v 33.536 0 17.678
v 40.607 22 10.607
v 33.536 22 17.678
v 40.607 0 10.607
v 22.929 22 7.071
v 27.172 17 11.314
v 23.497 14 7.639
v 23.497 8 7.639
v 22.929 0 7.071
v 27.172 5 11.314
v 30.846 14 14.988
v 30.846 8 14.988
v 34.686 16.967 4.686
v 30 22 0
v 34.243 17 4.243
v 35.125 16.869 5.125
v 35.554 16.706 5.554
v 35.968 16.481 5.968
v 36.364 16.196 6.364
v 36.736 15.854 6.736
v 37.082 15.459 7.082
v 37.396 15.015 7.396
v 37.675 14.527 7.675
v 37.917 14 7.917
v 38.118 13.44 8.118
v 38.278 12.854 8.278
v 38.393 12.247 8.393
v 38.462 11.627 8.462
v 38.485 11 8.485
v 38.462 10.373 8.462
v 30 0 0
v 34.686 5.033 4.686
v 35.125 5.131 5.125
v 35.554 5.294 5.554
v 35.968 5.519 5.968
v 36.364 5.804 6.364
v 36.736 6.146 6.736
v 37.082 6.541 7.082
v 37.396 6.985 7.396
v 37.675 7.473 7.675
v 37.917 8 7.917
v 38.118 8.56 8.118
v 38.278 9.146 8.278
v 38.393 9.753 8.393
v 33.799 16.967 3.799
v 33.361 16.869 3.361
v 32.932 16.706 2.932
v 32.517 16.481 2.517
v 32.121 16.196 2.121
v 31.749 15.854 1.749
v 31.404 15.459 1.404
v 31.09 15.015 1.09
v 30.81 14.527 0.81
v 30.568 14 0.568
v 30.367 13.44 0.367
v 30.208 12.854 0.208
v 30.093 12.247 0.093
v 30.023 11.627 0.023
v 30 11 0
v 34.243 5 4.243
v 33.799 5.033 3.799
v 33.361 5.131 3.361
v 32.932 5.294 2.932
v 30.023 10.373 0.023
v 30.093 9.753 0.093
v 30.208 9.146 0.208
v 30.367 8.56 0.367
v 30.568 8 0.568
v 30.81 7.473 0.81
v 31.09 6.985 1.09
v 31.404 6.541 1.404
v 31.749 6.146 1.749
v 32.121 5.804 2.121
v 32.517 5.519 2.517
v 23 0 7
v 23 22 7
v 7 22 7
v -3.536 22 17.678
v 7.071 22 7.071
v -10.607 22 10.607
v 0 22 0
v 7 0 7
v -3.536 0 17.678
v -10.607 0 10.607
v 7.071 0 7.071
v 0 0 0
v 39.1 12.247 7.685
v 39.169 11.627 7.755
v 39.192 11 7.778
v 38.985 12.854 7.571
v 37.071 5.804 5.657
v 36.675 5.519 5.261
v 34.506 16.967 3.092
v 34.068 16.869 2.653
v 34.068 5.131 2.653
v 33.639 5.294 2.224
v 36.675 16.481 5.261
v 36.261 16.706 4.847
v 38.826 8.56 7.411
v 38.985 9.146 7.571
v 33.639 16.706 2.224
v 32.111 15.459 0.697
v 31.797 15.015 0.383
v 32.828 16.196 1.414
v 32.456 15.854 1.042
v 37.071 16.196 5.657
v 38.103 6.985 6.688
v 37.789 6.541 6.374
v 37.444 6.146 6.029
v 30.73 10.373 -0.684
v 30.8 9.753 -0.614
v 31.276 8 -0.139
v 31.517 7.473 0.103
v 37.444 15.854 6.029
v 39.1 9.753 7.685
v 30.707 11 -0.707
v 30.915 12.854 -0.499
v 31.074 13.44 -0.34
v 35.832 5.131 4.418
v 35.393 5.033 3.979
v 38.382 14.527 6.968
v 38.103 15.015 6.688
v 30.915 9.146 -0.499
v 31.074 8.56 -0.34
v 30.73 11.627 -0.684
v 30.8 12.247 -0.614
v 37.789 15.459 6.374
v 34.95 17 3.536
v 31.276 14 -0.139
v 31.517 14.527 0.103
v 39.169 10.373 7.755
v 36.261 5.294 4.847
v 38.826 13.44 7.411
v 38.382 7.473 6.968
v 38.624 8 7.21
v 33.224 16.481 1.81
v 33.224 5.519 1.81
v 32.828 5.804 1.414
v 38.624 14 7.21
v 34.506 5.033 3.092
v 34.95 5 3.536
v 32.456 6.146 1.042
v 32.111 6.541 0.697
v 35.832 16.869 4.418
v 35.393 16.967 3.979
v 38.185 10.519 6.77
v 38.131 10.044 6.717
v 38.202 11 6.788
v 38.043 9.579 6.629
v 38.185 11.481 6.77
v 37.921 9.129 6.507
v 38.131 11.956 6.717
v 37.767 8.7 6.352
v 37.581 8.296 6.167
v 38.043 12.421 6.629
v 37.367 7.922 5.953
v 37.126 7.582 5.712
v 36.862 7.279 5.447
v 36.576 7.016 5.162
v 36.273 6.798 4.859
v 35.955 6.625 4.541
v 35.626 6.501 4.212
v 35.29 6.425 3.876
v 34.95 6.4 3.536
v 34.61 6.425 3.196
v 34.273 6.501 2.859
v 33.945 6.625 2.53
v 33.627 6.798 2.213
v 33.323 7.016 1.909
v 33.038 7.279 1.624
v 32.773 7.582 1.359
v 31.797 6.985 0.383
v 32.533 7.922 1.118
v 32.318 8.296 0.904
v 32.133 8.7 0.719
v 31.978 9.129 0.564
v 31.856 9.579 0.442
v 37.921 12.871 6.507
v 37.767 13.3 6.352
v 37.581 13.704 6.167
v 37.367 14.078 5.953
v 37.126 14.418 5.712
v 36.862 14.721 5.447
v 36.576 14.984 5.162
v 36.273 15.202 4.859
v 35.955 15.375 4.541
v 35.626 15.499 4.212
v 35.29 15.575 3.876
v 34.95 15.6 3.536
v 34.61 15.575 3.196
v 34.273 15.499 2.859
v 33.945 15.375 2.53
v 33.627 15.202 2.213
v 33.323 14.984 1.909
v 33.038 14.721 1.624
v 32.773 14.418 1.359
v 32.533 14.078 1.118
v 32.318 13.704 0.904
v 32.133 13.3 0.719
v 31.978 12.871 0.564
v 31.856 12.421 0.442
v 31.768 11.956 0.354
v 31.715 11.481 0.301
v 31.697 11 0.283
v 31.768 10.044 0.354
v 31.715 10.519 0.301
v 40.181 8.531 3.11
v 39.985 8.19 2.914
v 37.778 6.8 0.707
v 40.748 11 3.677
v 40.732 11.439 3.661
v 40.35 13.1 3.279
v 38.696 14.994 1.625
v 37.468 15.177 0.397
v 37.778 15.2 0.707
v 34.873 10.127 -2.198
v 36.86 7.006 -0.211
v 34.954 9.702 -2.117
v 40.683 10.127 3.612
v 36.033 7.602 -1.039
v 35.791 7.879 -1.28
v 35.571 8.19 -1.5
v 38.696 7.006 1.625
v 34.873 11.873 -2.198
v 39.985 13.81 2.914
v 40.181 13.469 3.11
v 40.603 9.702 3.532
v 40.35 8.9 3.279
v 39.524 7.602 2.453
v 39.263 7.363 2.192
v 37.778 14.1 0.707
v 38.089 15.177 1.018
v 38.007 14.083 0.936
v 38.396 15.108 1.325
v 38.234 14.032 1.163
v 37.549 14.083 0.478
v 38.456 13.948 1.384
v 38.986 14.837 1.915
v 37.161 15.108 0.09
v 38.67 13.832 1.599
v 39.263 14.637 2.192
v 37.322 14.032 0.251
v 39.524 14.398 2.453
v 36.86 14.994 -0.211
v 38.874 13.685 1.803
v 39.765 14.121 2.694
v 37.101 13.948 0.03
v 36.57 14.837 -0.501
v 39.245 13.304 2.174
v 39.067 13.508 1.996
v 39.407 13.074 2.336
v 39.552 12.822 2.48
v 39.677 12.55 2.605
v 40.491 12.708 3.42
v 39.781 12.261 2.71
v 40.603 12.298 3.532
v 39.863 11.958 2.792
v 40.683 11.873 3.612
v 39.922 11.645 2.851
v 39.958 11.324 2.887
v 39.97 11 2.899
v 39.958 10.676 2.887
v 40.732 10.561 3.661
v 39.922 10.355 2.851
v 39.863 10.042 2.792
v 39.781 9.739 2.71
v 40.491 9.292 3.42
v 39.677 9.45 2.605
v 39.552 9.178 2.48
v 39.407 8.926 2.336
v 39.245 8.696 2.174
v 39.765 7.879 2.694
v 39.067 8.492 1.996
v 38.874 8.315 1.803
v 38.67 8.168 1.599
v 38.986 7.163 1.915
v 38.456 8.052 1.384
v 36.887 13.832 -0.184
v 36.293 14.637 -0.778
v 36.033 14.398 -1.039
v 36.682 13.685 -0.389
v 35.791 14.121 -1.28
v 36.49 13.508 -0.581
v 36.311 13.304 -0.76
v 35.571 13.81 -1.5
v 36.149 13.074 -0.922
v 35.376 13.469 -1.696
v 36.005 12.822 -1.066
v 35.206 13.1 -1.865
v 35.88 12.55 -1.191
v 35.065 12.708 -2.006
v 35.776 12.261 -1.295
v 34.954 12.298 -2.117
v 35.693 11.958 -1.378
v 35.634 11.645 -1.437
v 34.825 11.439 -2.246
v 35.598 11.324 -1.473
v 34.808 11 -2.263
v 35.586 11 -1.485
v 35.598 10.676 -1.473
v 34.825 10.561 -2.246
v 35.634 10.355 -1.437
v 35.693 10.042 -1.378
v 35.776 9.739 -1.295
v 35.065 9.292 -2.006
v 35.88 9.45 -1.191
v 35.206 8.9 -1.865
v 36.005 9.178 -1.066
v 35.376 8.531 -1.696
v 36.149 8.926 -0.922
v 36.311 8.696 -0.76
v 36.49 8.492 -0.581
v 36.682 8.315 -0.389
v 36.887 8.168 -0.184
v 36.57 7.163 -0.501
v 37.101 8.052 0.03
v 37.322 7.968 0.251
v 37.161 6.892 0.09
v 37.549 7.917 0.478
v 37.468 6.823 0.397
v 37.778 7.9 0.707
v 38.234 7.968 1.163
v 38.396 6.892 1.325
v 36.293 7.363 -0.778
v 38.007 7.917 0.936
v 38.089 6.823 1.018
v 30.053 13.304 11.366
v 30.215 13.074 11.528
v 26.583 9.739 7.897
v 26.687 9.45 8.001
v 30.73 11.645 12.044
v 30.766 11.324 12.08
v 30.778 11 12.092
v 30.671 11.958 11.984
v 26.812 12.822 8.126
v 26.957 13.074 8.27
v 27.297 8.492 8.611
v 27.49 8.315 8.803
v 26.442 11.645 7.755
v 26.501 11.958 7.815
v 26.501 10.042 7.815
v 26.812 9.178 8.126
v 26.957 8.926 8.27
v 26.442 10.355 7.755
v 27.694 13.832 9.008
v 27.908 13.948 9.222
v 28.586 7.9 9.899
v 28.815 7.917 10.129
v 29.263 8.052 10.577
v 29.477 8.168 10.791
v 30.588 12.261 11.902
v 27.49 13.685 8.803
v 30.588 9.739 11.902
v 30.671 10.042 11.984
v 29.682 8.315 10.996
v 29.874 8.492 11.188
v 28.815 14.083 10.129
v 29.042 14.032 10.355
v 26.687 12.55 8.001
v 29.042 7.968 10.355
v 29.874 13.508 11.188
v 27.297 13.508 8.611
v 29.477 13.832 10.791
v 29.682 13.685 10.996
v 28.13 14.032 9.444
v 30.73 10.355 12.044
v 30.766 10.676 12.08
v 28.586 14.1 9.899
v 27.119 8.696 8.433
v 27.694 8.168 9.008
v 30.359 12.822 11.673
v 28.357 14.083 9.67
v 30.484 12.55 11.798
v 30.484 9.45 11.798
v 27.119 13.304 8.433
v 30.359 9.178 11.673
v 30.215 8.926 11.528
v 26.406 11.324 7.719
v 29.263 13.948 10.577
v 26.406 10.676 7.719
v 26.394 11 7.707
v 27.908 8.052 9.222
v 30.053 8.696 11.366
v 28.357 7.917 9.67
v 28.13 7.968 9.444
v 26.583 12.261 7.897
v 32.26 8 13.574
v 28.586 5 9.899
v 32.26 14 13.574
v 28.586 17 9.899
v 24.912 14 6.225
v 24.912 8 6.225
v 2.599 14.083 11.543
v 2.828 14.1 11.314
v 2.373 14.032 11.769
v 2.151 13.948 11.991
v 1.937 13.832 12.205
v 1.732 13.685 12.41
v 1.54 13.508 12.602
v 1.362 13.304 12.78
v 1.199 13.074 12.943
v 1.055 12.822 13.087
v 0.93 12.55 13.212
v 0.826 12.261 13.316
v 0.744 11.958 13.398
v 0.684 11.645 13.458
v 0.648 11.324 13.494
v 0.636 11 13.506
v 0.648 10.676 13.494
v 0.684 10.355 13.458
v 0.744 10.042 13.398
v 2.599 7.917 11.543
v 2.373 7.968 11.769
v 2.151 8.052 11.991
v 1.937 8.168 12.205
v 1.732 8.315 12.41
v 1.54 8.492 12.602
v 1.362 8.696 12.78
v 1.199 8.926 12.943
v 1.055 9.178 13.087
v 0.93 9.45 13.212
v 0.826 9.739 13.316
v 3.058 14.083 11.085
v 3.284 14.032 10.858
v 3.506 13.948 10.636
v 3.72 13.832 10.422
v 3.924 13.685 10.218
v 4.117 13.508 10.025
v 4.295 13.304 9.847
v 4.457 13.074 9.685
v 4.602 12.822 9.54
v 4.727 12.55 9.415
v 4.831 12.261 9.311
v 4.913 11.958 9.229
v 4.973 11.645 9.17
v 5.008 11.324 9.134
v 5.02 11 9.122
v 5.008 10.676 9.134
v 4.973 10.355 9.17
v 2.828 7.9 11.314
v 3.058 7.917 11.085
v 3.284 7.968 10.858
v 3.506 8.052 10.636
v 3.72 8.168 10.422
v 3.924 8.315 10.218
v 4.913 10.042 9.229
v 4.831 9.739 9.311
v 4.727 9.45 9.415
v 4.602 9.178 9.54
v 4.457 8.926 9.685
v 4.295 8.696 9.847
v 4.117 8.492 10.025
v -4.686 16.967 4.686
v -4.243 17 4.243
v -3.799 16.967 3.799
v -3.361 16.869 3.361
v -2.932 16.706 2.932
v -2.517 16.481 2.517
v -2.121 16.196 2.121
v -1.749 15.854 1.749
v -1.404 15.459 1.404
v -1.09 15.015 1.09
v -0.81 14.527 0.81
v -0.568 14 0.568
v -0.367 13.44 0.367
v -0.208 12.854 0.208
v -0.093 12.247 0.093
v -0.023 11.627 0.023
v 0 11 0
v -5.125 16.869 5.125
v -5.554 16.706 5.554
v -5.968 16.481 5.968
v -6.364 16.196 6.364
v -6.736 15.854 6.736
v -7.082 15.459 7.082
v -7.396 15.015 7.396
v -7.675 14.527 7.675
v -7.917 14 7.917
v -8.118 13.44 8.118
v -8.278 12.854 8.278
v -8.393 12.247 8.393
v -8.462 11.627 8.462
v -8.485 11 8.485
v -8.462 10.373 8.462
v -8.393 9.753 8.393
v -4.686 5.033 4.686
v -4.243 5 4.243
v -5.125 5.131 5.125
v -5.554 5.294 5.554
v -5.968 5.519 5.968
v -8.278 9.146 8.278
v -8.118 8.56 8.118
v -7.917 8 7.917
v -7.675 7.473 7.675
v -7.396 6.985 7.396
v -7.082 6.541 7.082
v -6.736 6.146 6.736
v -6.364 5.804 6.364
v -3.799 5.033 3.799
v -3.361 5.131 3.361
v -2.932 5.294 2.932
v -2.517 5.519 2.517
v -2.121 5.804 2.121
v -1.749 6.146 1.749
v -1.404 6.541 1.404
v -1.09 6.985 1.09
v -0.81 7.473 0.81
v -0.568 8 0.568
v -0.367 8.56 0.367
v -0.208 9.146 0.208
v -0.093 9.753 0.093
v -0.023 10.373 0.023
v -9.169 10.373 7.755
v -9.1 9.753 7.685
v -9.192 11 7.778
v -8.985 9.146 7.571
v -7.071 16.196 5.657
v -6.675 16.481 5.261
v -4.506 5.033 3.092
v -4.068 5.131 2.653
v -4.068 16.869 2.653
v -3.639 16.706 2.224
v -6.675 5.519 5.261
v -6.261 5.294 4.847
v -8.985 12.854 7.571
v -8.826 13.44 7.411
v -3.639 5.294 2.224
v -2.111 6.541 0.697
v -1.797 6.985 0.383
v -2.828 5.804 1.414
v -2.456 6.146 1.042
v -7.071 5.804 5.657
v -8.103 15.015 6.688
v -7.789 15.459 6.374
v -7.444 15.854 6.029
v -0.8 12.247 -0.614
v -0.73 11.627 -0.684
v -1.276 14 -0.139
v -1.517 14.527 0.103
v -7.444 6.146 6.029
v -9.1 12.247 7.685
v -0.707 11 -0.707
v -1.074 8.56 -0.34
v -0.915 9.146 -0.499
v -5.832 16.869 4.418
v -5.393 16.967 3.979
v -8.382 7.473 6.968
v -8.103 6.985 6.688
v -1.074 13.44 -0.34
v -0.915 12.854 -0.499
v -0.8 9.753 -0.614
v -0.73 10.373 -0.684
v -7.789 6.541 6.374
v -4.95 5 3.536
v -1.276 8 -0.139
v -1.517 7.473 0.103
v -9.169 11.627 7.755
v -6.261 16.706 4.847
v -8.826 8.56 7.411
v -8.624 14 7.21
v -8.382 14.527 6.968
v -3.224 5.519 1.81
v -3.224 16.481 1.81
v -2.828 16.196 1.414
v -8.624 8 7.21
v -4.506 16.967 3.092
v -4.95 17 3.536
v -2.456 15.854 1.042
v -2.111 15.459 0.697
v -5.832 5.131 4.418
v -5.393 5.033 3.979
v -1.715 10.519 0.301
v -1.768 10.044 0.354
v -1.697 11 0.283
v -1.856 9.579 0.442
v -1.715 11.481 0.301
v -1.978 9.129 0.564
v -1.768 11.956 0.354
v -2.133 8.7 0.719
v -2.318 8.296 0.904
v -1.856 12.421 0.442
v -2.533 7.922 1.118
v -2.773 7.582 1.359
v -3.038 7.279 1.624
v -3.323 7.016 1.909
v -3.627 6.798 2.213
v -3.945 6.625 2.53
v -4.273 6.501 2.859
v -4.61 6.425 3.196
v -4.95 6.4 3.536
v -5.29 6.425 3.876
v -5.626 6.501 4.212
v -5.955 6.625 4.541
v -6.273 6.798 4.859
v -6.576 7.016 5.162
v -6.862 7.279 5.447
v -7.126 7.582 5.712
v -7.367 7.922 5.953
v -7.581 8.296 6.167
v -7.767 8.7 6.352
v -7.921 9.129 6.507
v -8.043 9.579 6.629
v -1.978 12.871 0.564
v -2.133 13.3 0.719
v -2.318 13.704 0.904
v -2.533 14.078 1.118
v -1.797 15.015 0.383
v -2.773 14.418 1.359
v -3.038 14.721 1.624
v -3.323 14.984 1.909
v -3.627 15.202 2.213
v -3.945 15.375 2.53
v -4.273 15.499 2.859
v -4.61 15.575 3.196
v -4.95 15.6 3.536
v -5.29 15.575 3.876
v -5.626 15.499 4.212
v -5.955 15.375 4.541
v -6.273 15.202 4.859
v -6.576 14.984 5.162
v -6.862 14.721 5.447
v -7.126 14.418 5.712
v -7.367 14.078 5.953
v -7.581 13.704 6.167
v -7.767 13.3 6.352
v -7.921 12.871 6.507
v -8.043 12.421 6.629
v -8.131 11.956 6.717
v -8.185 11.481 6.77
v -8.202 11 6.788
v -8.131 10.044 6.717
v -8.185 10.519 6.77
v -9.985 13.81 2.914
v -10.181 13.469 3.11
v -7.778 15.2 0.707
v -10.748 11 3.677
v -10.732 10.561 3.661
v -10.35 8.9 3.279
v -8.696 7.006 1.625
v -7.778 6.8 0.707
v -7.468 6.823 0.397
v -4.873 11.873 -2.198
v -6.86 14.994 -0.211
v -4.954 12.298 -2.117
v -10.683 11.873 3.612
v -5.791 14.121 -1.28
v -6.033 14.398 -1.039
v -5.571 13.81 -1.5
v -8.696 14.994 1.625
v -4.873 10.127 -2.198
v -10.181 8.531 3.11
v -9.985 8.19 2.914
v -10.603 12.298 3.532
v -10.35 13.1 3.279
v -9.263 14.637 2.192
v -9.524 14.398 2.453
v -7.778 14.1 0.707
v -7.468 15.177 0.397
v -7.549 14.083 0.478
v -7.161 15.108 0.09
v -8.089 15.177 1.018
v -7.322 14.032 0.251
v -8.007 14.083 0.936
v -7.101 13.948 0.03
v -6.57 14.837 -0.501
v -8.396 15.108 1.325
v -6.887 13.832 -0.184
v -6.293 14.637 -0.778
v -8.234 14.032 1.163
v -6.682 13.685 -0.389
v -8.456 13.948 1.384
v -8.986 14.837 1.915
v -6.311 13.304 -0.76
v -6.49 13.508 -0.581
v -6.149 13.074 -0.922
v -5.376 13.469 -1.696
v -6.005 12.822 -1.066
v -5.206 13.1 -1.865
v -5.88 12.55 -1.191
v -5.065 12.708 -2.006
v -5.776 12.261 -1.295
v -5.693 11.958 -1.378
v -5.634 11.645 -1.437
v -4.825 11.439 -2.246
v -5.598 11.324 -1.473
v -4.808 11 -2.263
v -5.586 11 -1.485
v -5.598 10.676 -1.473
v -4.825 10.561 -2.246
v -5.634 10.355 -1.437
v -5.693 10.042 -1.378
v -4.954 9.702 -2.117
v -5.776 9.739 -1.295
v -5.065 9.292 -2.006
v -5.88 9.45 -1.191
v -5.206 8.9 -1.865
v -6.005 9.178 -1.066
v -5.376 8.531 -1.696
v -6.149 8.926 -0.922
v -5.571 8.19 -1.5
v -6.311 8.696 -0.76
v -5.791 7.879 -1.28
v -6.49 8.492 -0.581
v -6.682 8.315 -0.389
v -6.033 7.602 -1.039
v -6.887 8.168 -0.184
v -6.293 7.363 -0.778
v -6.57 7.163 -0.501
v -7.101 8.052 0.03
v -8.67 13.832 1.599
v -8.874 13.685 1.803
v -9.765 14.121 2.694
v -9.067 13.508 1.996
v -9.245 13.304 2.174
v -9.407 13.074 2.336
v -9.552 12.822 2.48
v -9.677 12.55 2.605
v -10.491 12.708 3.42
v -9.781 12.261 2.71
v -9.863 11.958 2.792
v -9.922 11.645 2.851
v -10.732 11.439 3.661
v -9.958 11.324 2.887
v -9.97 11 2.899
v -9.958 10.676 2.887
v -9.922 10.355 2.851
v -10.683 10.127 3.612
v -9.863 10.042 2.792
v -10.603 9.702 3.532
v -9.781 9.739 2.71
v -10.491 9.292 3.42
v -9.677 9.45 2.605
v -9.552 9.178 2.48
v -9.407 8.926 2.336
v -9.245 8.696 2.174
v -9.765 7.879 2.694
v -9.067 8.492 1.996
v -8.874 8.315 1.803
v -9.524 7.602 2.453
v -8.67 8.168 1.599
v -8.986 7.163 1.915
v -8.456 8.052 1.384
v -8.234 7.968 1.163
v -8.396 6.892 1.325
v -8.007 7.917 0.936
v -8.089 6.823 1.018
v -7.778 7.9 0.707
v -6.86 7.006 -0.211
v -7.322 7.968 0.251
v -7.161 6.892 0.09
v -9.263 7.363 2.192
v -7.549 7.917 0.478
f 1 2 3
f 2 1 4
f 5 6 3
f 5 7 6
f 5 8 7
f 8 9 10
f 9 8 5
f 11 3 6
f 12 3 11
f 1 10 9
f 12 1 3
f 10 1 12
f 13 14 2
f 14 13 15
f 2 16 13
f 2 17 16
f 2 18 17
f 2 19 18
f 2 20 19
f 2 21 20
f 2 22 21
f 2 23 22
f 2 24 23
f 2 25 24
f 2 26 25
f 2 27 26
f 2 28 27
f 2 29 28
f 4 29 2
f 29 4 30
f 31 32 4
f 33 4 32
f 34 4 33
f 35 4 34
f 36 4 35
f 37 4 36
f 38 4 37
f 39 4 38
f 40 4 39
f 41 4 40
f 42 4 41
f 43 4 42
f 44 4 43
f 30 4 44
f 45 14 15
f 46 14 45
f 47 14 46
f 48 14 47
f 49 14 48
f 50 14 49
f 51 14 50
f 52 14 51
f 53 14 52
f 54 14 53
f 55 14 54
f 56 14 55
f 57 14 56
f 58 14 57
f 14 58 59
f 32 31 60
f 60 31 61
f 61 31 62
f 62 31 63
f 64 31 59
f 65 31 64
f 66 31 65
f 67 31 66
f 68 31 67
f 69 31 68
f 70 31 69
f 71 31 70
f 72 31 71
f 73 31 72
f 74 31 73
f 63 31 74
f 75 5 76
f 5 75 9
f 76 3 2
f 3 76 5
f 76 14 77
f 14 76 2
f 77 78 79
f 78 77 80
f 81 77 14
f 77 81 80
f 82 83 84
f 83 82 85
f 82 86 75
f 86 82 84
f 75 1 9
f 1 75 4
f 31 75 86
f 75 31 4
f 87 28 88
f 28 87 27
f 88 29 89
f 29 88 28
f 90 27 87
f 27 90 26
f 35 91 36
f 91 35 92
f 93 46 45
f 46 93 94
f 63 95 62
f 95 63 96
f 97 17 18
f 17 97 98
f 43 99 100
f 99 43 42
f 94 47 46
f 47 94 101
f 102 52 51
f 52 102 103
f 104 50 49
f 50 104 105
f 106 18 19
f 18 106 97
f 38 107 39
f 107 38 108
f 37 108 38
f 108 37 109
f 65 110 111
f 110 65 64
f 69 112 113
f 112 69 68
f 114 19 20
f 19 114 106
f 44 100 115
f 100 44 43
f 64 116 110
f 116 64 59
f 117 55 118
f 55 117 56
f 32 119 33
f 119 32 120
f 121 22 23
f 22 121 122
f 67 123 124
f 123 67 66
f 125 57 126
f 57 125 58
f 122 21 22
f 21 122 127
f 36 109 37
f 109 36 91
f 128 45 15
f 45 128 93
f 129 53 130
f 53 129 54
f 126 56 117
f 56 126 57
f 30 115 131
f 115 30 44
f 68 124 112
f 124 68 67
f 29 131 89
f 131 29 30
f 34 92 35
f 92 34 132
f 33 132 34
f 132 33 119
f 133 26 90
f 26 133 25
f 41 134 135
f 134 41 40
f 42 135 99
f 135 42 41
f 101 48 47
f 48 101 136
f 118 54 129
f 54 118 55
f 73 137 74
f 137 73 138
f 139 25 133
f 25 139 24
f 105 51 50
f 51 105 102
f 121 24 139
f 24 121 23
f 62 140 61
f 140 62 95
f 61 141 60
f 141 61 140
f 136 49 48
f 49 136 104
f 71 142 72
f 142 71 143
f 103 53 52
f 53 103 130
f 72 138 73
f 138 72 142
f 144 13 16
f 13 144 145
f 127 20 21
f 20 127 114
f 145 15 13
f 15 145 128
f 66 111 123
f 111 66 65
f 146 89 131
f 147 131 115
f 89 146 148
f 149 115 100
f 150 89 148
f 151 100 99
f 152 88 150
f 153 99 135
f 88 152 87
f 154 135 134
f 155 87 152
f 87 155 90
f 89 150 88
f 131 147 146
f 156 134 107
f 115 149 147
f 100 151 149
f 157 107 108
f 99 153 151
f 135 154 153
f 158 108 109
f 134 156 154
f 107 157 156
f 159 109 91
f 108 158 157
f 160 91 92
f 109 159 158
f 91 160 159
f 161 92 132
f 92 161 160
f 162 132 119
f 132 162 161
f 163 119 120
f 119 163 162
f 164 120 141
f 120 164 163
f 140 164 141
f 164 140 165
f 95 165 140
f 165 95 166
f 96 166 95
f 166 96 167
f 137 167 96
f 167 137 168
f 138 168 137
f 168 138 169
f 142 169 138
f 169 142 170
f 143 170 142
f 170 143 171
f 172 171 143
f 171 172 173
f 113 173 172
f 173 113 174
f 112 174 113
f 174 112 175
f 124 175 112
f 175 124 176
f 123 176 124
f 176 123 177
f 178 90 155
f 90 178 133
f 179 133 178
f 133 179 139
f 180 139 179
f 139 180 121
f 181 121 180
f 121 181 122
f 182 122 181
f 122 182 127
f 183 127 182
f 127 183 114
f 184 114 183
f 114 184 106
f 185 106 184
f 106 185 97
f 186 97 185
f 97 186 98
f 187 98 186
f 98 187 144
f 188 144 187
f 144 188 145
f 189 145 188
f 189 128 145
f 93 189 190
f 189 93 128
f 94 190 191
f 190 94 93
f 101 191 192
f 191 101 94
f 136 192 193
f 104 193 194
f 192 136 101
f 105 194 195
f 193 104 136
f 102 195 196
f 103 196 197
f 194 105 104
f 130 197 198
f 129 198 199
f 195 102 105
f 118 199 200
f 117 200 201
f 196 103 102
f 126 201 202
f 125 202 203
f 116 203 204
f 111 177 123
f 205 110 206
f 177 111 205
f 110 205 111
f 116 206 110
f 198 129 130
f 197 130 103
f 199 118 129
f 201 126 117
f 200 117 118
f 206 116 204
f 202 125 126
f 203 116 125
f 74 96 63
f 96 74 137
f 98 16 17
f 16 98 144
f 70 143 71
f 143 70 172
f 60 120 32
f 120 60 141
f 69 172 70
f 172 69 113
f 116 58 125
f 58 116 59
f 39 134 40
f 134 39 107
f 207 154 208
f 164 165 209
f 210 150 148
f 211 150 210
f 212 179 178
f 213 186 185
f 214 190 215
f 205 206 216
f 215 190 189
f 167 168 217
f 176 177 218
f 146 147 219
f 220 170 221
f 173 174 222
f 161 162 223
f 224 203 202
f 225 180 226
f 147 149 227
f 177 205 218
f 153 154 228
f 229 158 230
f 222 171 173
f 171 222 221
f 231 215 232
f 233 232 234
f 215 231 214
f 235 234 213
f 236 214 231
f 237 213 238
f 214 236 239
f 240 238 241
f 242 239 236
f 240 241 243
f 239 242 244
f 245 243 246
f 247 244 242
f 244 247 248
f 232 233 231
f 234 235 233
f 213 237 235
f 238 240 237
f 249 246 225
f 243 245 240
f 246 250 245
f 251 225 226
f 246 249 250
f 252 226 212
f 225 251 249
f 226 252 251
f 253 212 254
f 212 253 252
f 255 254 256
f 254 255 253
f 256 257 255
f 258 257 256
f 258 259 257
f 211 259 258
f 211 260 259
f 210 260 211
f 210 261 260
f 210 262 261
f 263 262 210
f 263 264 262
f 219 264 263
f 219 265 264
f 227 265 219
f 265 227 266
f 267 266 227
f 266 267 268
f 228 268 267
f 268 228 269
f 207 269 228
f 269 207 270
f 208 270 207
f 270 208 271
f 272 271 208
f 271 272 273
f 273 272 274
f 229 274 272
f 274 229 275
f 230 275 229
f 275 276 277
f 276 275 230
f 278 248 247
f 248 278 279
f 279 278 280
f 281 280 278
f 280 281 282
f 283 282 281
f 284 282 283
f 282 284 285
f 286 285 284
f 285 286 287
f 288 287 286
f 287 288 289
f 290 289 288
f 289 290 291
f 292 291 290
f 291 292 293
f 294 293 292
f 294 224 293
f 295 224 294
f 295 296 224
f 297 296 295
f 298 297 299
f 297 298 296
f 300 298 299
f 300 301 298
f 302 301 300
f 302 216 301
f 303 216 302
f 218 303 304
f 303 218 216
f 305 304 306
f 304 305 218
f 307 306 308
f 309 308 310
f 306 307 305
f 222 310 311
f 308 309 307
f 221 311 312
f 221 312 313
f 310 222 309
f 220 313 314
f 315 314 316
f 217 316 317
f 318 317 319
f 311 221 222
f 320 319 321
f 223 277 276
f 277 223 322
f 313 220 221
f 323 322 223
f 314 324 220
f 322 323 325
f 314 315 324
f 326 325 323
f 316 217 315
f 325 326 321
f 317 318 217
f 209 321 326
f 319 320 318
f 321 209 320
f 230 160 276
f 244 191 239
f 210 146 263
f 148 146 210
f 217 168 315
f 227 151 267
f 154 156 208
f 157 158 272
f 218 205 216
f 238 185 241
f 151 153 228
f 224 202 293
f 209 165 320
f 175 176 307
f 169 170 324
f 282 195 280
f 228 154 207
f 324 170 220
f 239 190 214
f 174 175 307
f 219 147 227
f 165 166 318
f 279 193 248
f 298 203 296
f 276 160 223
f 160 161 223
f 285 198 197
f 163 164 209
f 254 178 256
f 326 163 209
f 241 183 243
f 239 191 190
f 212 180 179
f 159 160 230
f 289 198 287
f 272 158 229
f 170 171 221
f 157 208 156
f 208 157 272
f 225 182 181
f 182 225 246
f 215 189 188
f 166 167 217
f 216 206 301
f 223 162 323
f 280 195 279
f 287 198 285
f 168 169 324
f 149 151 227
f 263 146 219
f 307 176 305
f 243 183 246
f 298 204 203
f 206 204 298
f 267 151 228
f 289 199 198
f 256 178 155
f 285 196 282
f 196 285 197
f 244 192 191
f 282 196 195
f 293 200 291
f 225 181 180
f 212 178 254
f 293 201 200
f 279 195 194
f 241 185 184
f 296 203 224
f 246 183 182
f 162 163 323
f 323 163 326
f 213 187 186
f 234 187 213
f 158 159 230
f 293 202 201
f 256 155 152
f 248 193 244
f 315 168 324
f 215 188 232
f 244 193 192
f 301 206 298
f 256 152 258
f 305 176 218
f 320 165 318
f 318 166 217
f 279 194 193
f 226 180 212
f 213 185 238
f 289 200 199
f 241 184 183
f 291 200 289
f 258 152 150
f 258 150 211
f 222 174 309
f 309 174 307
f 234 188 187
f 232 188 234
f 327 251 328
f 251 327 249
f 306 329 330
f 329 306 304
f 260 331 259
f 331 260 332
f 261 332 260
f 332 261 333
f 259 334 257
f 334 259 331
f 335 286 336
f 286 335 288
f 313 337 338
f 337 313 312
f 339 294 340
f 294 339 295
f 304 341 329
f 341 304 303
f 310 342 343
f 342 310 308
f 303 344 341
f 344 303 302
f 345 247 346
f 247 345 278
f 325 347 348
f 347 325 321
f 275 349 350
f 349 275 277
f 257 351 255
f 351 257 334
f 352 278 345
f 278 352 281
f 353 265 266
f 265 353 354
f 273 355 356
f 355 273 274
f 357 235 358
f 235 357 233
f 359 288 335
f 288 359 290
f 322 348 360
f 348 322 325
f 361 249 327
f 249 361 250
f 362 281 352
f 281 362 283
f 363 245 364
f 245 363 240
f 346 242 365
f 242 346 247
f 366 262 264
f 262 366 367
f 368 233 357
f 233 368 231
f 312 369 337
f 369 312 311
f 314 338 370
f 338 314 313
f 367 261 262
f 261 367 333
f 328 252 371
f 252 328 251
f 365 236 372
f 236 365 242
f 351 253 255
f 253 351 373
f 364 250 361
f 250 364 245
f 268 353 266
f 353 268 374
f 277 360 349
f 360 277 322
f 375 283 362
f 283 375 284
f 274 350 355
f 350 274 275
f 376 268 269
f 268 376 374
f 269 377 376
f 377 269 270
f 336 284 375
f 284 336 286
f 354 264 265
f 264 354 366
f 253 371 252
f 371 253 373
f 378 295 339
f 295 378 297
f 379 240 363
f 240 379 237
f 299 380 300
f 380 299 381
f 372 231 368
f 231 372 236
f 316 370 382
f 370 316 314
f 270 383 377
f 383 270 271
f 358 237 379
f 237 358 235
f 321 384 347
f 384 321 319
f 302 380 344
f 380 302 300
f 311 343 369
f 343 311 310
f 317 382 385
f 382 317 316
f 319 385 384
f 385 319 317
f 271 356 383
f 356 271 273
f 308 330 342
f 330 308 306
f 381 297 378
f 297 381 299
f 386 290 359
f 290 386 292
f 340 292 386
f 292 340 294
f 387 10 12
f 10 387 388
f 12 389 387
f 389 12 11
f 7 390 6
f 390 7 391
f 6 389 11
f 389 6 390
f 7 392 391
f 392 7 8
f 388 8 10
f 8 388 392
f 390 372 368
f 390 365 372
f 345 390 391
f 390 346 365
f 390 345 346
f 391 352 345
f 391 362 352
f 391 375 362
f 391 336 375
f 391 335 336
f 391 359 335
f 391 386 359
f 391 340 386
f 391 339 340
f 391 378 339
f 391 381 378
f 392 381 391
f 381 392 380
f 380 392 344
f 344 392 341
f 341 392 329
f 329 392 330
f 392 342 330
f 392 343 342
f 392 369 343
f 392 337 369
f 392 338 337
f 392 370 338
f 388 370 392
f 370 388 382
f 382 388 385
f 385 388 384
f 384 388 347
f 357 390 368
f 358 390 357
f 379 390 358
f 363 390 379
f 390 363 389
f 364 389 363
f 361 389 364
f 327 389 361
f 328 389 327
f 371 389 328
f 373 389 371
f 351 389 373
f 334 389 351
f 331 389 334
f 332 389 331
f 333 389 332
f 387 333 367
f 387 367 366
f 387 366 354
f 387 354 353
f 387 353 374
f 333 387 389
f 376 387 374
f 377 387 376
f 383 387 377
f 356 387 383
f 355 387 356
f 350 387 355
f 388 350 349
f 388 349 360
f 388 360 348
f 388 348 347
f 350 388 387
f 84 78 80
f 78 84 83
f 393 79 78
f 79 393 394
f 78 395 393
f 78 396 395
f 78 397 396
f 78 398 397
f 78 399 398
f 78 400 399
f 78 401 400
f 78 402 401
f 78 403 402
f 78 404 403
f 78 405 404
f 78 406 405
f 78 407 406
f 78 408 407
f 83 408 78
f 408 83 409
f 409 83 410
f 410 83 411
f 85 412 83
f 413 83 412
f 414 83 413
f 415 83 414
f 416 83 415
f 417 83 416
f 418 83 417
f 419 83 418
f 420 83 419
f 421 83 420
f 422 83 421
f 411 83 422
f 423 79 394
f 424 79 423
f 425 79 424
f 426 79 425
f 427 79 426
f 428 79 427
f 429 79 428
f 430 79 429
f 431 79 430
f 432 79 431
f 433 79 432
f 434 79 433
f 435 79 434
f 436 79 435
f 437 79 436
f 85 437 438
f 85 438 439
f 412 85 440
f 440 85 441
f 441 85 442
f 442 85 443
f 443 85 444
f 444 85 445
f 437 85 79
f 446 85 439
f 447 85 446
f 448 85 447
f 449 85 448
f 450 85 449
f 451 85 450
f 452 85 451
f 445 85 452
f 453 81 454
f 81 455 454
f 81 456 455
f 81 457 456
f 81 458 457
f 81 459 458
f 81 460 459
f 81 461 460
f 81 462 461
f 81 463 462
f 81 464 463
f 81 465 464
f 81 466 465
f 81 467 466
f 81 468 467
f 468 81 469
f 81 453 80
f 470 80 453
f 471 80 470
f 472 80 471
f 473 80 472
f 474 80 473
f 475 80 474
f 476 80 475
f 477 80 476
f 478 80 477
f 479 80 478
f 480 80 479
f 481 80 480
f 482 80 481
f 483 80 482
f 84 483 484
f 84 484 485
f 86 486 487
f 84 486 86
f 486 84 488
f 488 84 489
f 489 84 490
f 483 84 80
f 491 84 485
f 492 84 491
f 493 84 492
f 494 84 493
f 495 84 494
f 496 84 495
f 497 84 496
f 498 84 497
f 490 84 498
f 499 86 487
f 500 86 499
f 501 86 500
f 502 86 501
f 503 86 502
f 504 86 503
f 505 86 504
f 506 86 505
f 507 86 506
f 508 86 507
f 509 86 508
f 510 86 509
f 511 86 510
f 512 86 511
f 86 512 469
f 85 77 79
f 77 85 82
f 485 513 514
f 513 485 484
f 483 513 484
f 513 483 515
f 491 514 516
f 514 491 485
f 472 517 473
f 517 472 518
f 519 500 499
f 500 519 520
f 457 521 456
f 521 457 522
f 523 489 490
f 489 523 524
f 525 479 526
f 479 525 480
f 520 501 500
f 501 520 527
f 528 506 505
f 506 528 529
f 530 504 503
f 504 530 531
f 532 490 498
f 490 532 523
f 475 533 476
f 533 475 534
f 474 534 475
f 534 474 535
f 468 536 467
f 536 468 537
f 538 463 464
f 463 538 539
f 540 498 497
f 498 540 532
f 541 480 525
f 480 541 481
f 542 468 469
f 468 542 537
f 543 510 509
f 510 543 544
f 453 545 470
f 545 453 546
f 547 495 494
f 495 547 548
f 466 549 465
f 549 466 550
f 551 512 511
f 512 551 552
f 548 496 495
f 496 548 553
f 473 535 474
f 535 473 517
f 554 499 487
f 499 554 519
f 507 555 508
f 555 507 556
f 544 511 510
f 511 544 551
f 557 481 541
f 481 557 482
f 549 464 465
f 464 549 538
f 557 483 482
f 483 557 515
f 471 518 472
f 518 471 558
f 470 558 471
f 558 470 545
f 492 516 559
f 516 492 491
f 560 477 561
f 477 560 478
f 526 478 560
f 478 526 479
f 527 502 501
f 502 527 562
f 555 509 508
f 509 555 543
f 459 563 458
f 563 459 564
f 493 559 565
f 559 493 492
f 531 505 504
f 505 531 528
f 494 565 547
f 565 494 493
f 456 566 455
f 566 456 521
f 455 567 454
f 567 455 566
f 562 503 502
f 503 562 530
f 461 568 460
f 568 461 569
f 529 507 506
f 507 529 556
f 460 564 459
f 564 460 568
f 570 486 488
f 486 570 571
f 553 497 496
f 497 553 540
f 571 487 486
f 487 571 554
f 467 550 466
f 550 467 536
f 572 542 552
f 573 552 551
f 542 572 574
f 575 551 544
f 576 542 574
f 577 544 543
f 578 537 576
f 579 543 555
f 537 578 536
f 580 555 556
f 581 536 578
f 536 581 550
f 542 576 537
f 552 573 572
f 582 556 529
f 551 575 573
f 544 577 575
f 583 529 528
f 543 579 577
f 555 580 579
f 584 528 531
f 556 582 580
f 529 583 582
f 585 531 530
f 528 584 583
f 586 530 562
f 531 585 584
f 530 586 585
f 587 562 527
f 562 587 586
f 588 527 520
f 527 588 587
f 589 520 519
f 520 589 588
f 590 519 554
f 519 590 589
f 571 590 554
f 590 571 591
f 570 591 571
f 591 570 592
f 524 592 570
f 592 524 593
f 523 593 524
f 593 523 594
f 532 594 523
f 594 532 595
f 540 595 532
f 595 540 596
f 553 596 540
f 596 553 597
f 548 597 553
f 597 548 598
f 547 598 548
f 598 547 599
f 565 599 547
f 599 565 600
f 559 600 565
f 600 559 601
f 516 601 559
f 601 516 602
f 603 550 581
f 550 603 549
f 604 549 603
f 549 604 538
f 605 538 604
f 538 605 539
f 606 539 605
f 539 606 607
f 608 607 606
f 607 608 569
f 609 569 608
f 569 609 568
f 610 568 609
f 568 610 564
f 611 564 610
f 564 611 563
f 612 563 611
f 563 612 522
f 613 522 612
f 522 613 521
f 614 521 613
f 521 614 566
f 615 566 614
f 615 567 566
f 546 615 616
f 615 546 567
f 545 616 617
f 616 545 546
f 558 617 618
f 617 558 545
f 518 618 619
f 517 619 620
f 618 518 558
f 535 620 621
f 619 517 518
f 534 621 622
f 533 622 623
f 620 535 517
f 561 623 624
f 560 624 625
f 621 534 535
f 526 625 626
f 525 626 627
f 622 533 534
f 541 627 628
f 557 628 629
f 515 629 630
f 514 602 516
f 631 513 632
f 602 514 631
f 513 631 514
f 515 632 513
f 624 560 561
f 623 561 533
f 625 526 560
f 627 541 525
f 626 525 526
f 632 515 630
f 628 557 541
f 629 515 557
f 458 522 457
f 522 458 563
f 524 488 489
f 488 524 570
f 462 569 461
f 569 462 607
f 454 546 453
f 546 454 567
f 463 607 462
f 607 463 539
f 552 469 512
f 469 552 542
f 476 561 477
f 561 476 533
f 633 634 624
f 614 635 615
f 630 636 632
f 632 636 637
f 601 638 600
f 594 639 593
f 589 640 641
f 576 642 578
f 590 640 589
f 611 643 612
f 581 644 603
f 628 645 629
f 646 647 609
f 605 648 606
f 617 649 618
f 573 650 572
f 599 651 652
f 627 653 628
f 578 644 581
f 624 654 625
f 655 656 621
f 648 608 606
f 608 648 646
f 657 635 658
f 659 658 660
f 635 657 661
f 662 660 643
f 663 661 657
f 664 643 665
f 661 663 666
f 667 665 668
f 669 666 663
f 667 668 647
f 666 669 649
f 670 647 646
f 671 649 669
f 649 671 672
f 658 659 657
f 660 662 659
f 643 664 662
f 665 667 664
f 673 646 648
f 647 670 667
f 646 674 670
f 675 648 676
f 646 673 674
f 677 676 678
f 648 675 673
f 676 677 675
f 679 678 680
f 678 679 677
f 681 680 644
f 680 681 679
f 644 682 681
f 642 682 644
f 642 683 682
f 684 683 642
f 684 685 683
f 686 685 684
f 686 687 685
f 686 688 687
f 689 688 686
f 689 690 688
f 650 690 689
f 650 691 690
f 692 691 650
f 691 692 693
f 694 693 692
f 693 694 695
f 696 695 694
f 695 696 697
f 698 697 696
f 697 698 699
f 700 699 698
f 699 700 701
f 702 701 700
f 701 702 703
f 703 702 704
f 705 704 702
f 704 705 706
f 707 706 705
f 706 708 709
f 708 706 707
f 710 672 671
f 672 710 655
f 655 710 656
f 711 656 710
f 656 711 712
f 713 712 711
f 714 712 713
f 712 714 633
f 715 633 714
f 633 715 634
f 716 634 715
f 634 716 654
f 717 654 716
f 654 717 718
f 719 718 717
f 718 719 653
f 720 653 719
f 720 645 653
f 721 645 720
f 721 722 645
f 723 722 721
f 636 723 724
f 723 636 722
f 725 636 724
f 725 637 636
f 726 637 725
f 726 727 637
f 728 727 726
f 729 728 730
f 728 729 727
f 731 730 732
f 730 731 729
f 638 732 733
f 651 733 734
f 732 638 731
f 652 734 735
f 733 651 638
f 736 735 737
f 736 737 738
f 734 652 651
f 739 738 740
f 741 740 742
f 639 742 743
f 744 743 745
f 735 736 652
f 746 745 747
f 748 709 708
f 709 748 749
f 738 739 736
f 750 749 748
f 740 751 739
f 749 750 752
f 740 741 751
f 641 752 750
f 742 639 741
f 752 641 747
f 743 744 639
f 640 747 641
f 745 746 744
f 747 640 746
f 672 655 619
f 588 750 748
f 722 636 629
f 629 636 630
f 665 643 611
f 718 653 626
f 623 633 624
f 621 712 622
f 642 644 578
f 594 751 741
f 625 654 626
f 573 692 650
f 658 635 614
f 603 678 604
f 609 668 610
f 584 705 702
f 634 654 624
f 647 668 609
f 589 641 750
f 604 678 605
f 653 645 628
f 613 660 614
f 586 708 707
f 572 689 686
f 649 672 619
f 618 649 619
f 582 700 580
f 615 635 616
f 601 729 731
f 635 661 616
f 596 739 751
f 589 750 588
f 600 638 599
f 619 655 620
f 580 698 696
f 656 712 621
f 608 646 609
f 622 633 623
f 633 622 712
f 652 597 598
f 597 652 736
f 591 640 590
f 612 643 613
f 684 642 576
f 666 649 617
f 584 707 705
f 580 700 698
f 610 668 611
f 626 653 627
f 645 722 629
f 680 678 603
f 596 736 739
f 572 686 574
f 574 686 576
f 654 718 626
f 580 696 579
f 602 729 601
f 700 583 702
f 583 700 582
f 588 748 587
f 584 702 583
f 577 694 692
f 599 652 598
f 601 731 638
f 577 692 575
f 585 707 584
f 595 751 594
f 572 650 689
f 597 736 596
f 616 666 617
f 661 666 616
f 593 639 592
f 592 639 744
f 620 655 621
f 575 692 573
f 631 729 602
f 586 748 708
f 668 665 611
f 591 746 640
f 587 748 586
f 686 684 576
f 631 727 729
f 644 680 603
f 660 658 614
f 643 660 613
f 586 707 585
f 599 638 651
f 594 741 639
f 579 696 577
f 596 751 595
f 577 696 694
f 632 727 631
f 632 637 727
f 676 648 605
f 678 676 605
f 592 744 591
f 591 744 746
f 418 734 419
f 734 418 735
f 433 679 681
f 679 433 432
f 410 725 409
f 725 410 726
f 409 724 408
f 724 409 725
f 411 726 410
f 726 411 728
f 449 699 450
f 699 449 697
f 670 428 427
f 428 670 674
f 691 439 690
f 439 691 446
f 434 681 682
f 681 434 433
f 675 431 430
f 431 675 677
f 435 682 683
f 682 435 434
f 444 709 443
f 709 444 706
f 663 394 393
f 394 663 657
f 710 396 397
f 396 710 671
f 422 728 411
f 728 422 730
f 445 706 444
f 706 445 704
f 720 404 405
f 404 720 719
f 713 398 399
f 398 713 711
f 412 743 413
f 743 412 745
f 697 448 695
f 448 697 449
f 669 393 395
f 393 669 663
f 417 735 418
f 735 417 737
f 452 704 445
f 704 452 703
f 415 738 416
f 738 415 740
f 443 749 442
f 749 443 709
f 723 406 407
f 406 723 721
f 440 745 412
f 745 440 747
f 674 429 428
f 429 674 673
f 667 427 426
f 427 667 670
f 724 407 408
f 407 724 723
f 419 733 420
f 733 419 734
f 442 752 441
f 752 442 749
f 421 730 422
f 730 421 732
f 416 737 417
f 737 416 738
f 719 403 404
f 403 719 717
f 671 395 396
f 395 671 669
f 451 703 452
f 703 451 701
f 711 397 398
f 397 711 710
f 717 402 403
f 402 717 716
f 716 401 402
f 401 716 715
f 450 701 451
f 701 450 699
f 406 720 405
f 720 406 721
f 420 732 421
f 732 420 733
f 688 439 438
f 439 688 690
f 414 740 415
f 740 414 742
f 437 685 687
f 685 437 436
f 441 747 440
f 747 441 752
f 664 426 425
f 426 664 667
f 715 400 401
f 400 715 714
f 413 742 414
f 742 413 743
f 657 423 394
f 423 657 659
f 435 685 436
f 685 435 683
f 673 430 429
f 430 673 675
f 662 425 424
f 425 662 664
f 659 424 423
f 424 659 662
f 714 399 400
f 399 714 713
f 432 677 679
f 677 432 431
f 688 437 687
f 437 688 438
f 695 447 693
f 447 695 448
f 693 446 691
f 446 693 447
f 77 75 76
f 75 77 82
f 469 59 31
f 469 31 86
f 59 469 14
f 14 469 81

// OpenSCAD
// [FL_INDEX: keywords="openscad, 3d_parametric, sliding__for_rectangular_sections, csg_solid" | COT="Parametric OpenSCAD design from 3DCodeverse"]
// Title: sliding, for rectangular sections


//////////////DICHIARAZIONI///////////////////////

//flange width
L=30;
// Element width
Sp=22;
// Roundness
$fn=60; 

////////////////////


module angolare()
difference()
{
union()
{
cube([15,Sp,10]);
translate([6,Sp/2,-1])cylinder(2,6,6);
translate([6,Sp/2,-5])cylinder(4,4.2,4.6);

}
translate([6,Sp/2,-6])cylinder(17,3.1,3.1);
translate([6,Sp/2,8])rotate([0,0,30])cylinder(4,6,6,$fn=6);
}
module angolare1()
difference()
{
union()
{
cube([15,Sp,10]);
translate([6,Sp/2,-1])cylinder(2,6,6);
translate([6,Sp/2,-5])cylinder(4,4.2,4.6);

}
translate([6,Sp/2,-6])cylinder(17,3.1,3.1);
}

translate([L,0,0])rotate([0,-45,0])angolare();
translate([0,Sp,0])rotate([0,-45,180])angolare1();


hull()//corpo centrale
{
cube([L,Sp,1]);
translate([7,0,6])cube([L/2+1,Sp,1]);
}
